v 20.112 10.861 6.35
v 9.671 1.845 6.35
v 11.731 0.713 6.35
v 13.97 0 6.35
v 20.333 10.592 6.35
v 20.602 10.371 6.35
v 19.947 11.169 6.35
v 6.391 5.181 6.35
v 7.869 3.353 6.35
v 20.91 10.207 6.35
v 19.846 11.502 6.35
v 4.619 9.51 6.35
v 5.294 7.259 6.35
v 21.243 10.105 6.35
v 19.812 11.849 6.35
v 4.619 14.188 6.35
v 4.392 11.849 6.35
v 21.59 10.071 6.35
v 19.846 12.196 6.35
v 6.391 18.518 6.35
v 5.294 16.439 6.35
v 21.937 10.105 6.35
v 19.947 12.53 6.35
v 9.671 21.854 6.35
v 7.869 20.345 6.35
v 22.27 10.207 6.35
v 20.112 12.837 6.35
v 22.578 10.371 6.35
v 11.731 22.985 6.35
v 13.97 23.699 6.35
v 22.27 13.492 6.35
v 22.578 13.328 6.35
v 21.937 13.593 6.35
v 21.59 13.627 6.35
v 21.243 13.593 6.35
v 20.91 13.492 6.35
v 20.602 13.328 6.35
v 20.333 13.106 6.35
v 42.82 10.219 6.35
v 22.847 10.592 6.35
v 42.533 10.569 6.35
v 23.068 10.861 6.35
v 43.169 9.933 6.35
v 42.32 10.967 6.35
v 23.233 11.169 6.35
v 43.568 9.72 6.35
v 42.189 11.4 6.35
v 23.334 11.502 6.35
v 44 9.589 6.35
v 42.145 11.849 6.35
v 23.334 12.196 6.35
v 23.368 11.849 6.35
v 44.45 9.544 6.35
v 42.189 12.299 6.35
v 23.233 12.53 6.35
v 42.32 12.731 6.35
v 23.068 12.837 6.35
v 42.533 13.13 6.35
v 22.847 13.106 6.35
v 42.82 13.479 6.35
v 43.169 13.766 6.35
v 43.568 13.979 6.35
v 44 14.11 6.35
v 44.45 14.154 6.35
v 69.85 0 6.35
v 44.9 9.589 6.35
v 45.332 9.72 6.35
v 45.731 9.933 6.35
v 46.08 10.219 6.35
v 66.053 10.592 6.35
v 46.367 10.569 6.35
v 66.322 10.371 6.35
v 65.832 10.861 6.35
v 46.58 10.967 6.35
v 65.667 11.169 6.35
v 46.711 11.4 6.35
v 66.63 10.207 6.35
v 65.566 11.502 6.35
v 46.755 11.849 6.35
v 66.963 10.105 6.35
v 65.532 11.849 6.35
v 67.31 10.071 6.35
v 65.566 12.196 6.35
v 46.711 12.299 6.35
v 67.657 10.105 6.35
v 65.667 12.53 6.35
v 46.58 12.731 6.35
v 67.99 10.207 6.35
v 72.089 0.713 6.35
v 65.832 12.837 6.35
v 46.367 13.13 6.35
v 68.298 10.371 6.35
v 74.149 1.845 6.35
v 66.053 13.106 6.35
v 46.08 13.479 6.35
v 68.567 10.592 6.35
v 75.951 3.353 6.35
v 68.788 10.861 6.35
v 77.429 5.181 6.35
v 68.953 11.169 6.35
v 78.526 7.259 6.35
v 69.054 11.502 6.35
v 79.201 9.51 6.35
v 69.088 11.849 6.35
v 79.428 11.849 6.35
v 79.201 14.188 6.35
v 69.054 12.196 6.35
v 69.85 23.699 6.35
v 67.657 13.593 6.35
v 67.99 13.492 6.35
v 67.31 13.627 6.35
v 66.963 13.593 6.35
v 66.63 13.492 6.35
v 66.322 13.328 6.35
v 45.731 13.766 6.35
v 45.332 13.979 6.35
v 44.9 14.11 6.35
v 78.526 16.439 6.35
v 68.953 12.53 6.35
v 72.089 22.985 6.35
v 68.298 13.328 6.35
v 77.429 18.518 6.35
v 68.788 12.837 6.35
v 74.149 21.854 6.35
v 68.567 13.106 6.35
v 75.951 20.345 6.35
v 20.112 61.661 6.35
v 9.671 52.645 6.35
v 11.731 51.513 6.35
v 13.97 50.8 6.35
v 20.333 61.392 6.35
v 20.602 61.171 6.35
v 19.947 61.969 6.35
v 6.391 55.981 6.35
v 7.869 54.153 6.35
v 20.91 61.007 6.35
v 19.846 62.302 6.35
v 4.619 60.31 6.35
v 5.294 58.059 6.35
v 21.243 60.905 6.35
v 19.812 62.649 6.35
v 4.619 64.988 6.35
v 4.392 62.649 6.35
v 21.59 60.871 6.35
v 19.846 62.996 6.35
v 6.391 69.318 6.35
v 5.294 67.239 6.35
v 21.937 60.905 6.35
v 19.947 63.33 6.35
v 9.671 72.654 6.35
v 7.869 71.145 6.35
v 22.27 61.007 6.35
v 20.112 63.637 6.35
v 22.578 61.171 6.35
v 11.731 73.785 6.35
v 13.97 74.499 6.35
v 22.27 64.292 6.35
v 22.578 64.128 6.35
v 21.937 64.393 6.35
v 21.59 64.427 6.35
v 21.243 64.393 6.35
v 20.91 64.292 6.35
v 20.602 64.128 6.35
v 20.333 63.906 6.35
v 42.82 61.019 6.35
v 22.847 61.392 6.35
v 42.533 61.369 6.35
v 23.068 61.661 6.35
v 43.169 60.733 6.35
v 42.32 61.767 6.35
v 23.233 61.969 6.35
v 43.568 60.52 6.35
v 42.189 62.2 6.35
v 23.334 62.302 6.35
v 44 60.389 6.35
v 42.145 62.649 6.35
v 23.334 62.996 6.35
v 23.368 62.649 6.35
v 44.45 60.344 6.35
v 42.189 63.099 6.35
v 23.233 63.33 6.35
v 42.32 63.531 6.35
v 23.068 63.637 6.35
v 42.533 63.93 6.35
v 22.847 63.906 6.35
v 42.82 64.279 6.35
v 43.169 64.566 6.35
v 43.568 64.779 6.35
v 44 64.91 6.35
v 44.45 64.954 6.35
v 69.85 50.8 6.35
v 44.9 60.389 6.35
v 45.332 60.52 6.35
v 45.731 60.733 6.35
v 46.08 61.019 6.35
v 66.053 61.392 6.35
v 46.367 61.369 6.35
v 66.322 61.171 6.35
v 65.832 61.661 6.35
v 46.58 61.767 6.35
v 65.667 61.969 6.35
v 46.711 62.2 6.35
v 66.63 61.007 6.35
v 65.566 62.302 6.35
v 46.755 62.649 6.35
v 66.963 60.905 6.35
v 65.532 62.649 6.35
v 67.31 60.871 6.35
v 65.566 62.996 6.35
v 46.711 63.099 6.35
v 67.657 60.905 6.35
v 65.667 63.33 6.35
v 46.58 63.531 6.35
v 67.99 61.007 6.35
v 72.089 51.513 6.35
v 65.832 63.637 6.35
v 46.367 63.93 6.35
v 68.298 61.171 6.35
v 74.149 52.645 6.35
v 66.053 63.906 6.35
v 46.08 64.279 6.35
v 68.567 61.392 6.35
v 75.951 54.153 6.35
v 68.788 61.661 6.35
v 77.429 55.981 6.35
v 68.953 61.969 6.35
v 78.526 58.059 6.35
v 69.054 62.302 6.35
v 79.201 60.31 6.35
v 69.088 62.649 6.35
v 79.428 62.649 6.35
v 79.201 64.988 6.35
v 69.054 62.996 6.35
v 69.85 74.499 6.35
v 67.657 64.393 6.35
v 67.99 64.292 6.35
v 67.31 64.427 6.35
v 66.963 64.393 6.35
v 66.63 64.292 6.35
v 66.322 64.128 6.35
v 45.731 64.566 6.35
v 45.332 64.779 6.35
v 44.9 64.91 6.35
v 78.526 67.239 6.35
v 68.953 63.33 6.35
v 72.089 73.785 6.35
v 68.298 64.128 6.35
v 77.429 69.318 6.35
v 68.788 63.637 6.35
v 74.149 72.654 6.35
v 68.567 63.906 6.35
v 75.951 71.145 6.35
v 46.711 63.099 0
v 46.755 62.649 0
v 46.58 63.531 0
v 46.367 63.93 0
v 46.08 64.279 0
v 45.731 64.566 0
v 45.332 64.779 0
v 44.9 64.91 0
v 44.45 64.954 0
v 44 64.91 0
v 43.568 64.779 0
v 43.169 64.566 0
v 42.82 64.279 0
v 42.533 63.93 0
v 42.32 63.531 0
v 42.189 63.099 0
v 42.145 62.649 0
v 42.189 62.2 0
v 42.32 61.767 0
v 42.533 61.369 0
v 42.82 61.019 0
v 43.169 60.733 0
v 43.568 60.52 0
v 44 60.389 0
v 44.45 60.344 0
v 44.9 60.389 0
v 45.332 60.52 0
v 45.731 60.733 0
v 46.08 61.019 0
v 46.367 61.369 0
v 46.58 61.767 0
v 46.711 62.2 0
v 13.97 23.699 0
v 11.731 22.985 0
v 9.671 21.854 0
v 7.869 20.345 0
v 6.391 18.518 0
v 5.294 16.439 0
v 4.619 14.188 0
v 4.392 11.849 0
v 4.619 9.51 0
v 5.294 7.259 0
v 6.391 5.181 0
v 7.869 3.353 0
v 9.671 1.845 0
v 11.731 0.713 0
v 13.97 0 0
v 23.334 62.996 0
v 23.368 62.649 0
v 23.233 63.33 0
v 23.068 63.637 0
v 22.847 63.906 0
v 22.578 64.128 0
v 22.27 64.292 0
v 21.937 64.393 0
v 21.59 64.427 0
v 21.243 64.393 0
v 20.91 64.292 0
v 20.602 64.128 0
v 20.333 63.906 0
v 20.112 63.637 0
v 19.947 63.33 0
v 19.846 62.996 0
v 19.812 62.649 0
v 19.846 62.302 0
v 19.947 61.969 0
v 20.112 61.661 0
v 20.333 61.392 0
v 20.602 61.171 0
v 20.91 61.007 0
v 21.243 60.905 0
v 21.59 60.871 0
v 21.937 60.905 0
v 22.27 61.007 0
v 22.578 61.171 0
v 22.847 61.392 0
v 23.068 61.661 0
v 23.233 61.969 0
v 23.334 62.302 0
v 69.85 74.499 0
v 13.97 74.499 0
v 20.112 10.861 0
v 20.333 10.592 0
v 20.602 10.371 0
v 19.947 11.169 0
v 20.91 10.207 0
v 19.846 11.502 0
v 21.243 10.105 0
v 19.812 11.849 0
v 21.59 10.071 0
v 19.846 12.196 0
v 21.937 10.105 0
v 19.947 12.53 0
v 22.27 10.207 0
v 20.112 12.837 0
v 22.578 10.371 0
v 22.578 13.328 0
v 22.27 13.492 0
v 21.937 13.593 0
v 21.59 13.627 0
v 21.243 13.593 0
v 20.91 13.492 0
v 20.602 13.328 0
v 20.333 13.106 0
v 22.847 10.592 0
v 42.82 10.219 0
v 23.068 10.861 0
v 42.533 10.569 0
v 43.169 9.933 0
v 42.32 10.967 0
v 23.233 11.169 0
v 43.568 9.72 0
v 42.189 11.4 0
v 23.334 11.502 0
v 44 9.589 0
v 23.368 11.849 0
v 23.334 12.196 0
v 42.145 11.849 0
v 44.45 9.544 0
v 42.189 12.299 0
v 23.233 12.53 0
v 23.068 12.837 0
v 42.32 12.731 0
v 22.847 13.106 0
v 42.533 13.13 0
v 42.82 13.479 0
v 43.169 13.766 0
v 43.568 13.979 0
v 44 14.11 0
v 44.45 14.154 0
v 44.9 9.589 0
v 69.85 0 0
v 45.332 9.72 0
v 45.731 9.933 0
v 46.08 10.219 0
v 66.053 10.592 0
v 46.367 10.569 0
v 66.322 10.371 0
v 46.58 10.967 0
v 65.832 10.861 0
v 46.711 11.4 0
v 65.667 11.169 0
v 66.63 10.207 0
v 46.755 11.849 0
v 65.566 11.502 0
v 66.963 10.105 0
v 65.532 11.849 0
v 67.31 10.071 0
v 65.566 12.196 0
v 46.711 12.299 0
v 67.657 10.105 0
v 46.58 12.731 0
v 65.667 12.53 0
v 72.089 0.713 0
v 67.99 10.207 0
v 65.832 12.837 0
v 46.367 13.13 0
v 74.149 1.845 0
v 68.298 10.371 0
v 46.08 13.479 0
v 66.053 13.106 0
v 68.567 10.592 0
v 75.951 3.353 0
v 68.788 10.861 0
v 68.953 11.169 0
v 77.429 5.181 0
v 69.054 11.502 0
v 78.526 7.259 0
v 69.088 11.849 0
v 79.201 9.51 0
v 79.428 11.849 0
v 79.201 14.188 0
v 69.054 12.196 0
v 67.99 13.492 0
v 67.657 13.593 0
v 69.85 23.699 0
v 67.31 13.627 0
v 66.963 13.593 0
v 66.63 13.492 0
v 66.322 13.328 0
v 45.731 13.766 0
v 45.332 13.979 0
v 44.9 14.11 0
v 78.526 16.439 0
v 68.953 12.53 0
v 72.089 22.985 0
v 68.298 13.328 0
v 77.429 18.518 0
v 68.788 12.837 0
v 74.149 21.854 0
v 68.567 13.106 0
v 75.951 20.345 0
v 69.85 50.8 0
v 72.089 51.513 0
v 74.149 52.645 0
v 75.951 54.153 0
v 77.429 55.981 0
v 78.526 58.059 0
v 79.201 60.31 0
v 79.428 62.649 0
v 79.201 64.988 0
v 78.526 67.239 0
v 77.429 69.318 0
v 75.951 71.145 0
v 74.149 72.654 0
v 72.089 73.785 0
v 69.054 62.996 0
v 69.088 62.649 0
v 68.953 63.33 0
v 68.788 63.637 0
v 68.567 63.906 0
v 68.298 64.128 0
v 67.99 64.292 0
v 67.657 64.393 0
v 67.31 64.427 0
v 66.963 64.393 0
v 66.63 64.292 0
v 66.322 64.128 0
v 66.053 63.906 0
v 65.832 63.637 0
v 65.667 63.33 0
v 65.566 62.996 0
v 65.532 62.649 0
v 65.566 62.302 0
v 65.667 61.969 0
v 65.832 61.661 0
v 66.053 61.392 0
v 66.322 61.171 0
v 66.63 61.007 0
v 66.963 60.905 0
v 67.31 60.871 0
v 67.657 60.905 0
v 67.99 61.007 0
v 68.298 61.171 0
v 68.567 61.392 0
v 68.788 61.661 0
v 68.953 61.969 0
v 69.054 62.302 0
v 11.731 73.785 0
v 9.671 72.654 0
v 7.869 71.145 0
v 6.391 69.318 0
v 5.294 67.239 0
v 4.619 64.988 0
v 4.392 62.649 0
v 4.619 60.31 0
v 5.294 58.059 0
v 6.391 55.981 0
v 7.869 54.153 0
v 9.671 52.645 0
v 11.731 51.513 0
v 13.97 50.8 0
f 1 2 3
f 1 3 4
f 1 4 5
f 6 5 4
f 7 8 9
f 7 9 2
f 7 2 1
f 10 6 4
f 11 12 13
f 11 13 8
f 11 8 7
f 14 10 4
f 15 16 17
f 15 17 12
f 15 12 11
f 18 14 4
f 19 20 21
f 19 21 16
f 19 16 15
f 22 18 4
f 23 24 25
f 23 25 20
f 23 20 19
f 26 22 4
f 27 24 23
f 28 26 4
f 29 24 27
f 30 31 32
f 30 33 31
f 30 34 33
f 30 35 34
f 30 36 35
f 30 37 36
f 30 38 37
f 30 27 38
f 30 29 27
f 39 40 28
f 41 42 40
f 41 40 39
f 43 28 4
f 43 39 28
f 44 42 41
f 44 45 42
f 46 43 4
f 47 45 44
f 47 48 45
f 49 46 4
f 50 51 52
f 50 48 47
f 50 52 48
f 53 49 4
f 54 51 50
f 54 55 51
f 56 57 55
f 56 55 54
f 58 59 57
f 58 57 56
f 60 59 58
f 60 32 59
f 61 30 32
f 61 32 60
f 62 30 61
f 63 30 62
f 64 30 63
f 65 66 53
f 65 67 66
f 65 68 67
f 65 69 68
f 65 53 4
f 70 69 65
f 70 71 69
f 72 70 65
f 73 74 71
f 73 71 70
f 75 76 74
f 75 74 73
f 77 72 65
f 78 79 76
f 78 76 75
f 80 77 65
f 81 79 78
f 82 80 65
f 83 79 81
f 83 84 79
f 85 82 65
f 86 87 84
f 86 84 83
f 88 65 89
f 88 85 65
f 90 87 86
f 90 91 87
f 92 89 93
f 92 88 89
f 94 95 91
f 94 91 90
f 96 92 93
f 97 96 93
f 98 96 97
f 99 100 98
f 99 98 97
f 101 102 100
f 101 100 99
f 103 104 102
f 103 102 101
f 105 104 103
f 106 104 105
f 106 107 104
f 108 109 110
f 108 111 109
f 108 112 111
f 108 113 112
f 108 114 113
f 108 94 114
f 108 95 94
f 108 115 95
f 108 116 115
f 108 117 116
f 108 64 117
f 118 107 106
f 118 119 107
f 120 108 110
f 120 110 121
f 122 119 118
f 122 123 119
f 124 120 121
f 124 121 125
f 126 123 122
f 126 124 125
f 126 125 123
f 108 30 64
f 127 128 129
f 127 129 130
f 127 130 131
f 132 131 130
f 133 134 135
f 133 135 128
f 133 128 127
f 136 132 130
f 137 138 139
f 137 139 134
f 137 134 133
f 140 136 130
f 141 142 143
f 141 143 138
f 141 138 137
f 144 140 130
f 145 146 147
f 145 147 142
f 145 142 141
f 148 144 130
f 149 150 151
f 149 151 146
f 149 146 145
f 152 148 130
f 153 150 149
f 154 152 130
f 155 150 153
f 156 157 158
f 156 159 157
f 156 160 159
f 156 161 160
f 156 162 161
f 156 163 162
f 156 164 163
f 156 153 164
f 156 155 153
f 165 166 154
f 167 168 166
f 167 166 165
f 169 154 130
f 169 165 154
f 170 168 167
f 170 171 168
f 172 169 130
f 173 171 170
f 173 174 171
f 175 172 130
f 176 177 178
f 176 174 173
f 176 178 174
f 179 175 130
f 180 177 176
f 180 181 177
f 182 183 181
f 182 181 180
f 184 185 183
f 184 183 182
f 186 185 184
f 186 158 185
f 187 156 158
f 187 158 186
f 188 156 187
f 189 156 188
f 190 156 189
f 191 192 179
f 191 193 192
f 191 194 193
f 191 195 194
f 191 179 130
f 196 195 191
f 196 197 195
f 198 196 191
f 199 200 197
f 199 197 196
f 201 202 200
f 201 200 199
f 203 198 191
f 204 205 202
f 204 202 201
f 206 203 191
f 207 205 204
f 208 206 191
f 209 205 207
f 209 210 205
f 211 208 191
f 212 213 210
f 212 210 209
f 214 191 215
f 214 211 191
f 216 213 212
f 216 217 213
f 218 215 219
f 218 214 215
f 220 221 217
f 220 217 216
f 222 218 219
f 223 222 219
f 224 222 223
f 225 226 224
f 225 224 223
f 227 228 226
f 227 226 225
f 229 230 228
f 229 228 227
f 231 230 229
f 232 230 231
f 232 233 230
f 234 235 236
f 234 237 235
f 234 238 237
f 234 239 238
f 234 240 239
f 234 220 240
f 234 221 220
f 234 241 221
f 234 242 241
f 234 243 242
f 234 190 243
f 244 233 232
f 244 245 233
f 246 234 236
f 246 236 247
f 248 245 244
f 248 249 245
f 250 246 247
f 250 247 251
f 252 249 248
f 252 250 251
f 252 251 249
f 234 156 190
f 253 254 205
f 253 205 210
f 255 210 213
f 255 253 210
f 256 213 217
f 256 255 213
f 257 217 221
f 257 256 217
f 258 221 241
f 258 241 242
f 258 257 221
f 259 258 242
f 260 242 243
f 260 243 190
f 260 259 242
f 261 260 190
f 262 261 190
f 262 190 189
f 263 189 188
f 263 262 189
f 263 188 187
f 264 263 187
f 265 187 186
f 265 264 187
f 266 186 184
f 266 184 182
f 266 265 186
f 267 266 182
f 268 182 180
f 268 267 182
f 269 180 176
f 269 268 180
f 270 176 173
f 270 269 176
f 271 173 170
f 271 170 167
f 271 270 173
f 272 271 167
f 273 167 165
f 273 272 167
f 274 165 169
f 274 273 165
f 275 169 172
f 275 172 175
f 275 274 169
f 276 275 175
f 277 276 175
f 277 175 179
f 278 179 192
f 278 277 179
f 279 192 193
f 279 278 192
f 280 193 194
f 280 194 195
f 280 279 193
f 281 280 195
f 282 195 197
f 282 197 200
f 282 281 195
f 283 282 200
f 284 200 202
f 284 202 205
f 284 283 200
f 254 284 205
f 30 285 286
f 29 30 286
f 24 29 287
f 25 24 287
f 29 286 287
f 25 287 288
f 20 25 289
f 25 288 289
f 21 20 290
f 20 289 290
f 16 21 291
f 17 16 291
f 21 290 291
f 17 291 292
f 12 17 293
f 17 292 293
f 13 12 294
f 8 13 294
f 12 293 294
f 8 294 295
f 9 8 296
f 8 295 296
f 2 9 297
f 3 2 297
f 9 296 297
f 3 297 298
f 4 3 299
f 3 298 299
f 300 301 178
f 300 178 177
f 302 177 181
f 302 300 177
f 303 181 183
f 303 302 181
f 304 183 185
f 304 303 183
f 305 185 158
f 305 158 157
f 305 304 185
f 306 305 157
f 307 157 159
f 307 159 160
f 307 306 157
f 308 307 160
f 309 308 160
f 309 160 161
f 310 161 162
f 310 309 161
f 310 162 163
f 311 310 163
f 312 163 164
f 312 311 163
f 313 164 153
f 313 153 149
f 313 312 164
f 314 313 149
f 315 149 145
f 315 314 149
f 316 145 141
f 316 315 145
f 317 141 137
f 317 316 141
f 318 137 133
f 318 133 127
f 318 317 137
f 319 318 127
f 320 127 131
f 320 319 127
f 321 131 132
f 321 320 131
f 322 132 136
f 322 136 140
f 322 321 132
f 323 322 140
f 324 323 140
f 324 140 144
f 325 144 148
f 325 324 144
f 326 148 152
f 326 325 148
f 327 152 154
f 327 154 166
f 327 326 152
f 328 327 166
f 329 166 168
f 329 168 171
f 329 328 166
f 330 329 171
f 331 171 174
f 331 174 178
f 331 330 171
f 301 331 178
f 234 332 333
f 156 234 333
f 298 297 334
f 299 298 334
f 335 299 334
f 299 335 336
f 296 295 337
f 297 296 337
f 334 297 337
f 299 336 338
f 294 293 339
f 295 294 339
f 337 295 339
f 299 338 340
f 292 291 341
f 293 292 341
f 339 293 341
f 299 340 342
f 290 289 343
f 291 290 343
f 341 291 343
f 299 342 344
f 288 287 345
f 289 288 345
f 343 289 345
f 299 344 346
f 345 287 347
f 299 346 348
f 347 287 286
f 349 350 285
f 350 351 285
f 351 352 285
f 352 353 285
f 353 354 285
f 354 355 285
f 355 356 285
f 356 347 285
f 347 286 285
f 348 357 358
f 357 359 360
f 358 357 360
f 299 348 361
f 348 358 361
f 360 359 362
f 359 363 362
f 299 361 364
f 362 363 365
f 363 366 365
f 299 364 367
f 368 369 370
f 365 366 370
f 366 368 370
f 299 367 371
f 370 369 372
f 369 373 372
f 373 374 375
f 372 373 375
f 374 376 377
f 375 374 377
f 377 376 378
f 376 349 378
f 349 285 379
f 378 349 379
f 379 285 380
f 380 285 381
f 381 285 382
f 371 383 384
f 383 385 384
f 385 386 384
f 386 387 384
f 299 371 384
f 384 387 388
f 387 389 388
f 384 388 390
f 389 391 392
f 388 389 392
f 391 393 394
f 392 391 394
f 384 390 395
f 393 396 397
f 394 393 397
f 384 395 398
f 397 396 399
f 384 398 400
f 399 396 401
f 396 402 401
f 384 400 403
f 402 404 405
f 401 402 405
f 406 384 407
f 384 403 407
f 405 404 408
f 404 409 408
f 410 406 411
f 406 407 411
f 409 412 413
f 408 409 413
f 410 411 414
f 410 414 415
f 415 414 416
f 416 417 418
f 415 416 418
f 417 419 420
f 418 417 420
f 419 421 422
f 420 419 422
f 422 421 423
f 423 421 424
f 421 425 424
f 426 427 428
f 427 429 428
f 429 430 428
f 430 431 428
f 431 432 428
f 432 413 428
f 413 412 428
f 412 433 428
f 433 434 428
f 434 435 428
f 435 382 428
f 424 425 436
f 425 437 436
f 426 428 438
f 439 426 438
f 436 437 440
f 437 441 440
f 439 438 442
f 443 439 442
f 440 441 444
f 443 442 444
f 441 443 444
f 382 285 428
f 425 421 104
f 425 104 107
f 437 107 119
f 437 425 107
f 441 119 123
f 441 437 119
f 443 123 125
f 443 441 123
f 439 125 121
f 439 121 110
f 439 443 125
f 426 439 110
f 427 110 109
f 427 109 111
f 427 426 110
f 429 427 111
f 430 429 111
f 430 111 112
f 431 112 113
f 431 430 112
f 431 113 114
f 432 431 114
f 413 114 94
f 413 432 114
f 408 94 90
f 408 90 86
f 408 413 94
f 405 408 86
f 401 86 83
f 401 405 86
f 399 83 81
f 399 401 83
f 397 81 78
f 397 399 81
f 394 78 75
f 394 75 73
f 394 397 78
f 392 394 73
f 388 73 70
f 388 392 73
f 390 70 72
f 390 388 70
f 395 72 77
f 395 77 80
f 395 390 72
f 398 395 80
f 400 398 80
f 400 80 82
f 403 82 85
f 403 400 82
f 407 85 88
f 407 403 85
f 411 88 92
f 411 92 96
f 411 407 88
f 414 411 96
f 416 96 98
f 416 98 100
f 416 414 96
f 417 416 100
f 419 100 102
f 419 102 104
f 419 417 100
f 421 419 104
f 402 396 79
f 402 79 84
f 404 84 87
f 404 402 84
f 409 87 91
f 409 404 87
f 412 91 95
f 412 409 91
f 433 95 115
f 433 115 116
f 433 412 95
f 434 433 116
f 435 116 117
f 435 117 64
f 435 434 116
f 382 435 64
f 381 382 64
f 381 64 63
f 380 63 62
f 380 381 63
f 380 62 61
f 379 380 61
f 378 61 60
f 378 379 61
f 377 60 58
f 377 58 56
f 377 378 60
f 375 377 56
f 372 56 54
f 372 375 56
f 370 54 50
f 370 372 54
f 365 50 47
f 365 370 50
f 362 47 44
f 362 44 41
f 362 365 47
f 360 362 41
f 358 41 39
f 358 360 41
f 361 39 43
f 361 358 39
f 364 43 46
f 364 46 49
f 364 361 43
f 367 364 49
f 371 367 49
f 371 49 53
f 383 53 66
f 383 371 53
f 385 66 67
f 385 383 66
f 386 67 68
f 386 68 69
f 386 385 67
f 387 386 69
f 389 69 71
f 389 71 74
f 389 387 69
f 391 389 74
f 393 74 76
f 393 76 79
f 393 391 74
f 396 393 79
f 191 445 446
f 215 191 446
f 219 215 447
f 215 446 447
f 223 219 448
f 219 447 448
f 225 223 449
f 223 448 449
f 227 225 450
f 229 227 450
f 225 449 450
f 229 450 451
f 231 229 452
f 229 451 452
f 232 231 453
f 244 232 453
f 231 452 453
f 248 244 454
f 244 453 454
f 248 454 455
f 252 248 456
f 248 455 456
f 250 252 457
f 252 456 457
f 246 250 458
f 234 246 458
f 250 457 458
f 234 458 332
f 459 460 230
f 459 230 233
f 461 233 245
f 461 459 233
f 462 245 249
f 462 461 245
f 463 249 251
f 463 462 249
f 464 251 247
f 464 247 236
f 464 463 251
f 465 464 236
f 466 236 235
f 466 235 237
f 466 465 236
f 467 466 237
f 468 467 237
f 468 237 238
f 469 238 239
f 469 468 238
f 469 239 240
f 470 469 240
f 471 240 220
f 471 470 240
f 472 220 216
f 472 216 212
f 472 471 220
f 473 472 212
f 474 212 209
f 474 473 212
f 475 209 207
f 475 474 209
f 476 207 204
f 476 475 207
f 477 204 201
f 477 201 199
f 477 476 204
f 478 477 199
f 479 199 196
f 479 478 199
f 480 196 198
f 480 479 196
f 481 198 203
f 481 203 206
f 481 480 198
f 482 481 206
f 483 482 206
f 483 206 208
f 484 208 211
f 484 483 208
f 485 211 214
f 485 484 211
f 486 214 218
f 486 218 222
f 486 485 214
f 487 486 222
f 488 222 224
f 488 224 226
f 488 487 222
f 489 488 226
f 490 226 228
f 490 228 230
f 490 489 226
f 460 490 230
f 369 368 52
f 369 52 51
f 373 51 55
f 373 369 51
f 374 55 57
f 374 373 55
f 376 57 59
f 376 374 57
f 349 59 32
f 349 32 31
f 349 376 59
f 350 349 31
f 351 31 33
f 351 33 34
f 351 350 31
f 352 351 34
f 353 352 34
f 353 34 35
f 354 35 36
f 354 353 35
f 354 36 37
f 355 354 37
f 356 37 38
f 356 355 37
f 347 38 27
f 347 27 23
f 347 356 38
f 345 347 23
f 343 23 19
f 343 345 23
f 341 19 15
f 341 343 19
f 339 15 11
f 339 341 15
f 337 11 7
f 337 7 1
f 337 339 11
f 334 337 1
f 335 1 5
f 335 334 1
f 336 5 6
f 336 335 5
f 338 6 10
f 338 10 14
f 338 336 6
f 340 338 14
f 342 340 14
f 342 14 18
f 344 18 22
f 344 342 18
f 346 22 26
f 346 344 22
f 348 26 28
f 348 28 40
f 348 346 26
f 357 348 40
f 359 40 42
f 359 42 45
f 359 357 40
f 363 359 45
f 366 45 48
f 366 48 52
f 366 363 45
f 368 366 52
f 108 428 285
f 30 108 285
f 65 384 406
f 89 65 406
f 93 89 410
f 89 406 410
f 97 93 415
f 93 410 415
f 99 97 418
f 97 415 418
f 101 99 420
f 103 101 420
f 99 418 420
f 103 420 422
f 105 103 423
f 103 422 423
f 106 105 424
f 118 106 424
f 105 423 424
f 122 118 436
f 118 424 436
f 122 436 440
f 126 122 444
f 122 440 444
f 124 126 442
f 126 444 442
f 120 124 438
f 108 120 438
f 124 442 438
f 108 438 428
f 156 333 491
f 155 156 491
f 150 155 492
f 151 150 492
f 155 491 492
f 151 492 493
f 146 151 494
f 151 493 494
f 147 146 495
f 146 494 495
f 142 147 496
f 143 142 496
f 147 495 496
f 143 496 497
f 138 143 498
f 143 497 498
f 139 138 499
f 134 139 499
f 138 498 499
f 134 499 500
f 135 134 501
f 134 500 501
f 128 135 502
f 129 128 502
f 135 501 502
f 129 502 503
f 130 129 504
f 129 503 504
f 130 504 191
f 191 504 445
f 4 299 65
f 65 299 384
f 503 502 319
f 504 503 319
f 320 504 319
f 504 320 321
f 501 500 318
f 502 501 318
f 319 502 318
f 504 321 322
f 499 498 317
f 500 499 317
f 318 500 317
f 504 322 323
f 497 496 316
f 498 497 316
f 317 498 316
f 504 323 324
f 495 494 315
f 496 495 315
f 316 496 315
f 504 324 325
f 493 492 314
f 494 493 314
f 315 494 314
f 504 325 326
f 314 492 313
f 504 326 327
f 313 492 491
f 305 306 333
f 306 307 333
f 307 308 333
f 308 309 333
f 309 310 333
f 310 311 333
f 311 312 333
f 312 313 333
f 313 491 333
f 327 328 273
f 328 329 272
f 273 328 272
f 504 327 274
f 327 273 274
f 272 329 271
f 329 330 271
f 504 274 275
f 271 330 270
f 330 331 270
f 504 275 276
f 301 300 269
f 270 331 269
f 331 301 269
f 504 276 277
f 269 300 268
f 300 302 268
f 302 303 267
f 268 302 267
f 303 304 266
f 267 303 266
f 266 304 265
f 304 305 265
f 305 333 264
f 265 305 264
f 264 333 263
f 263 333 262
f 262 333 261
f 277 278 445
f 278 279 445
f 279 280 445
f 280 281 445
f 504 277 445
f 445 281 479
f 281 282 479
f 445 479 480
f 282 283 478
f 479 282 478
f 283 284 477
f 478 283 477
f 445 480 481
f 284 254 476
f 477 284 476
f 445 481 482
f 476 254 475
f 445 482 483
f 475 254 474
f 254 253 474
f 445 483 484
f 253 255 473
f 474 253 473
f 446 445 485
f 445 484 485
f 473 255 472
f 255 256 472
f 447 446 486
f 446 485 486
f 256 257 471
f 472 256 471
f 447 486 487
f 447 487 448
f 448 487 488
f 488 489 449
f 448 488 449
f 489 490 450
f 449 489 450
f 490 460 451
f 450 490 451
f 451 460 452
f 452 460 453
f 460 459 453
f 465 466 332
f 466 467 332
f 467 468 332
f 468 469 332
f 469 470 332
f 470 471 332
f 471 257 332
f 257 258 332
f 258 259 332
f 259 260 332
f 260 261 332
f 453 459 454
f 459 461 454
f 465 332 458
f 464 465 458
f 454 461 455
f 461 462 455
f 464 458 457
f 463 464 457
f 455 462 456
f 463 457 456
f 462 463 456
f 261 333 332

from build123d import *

# Parameters (mm, degrees)
SKETCH9_R           = 2.305
SKETCH9_R_2         = 1.778
BOSS_EXTRUDE1_DEPTH = 6.35


with BuildPart() as part:
    # Sketch9 → Boss-Extrude1 (new body)
    with BuildSketch(Plane.XY):
        with BuildLine():
            Line((19.05, 0), (69.85, 0))
            ThreePointArc((69.85, 0), (79.428440233, 11.849261314), (69.85, 23.698522628))
            Line((69.85, 23.698522628), (19.05, 23.698522628))
            Line((19.05, 23.698522628), (13.97, 23.698522628))
            ThreePointArc((13.97, 23.698522628), (4.391559767, 11.849261314), (13.97, 0))
            Line((13.97, 0), (19.05, 0))
        make_face()
        with Locations((44.45, 11.849261314)):
            Circle(SKETCH9_R, mode=Mode.SUBTRACT)
        with Locations((67.31, 11.849261314)):
            Circle(SKETCH9_R_2, mode=Mode.SUBTRACT)
        with Locations((21.59, 11.849261314)):
            Circle(SKETCH9_R_2, mode=Mode.SUBTRACT)
    extrude(amount=BOSS_EXTRUDE1_DEPTH)


with BuildPart() as body_2:
    # Body-Move/Copy1: copy of part
    add(part.part.moved(Location((0, 50.8, 0))))


solid = Compound([part.part, body_2.part])
